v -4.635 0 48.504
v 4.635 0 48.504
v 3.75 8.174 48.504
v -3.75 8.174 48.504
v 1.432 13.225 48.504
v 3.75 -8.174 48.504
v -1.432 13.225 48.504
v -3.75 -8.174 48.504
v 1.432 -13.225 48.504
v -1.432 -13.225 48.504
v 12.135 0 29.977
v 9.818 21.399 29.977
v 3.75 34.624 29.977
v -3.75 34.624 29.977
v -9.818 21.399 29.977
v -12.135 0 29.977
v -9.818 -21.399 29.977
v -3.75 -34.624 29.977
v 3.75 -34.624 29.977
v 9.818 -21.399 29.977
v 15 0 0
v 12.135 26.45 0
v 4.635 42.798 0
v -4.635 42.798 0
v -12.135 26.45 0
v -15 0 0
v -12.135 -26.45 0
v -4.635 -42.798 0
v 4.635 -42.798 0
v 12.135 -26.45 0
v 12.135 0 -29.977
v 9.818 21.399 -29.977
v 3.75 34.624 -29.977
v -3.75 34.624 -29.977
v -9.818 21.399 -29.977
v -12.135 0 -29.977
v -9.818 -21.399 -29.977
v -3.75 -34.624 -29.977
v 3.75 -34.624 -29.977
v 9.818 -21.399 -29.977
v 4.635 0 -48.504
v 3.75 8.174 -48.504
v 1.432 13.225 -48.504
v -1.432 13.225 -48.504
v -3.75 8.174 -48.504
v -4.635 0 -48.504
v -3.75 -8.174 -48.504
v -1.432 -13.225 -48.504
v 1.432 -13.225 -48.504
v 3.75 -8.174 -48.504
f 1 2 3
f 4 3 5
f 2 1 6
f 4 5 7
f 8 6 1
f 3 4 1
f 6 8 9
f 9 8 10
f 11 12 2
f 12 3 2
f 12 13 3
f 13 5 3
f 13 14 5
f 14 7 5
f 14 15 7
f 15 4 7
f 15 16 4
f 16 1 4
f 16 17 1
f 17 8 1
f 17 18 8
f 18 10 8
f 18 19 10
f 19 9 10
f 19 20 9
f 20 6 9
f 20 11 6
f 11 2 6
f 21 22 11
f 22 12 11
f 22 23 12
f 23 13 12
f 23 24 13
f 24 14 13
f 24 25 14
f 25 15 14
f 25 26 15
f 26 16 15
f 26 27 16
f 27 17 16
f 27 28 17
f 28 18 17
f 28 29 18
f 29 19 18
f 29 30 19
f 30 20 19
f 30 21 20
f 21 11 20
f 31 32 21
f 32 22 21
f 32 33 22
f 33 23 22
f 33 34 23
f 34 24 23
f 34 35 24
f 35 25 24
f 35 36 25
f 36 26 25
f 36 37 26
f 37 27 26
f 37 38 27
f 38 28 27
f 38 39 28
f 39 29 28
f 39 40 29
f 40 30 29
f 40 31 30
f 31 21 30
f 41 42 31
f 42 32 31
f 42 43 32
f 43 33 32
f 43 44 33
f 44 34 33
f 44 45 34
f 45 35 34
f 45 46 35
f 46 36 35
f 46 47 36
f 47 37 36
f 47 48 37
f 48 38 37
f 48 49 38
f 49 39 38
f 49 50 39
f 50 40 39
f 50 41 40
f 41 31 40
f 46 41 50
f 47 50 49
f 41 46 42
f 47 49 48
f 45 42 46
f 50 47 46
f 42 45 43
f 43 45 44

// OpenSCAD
// Generated by SolidPython 1.0.1 on 2020-07-29 00:46:46


scale(v = [5, 15, 17]) {
	sphere(r = 3);
}
/***********************************************
*********      SolidPython code:      **********
************************************************
 
# import packages: SolidPython
from solid import *
from solid.utils import *
from itertools import chain, combinations, permutations


class Resize:

    def __init__(self, scad_file):
        self.scad_file = scad_file
        #self.scad_file = import_scad(scad_file)
        # cone/cylinder param:
        self.r1 = 0
        self.r2 = 0
        self.h = 0
        # rectangular prism param:
        self.w = 0
        self.l = 0
        # ellipse param:
        self.r = 0

    # import OpenScad code (file name corresponds to shape)


    # classify shape + parameters
    def assign(self, param1, param2, param3):
        if self.scad_file == 'cone.scad':
            self.r1 = param1
            self.r2 = param2
            self.h = param3
        elif self.scad_file == 'cylinder.scad':
            self.r1 = param1
            self.r2 = param2
            self.h = param3
        elif self.scad_file == 'rectangularPrism.scad':
            self.h = param1
            self.l = param2
            self.w = param3
        else:
            self.r = param1
            self.h = param2

    # resize parameters
    def iterate(self):
        x = range(3, 20, 2)
        i = 1
        if self.scad_file == 'cone.scad':
            tempList = list(permutations(x, 2))
            for temp in tempList:
                param1 = temp[0]
                param2 = temp[1]
                filepath = 'produced_scad_files/' + 'cone' + str(param1) + '_' + str(param2) + '_' + '.scad'
                scad_render_to_file(cylinder(h=param1, r1=param2, r2=0), filepath)

        elif self.scad_file == 'cylinder.scad':
            tempList = list(permutations(x, 3))
            for temp in tempList:
                param1 = temp[0]
                param2 = temp[1]
                filepath = 'produced_scad_files/' + 'cylinder' + str(param1) + '_' + str(param2) + '_' + '.scad'
                scad_render_to_file(cylinder(h=param1, r1=param2, r2=param2), filepath)

        elif self.scad_file == 'rectangularPrism.scad':
            tempList = list(permutations(x, 3))
            for temp in tempList:
                param1 = temp[0]
                param2 = temp[1]
                param3 = temp[2]
                filepath = 'produced_scad_files/' + 'rectangularPrism' + str(param1) + '_' + str(param2) + '_' + str(
                    param3) + '.scad'
                scad_render_to_file(cube(size=(param1, param2, param3)), filepath)

        elif self.scad_file == 'ellipse.scad':
            tempList = list(permutations(x, 4))
            for temp in tempList:
                param1 = temp[0]
                param2 = temp[1]
                param3 = temp[2]
                param4 = temp[3]
                filepath = 'produced_scad_files/' + 'ellipse' + str(param1) + '_' + str(param2) + '_' + str(param3) + '_' + str(param4) + '.scad'
                scad_render_to_file(scale([param1, param2, param3])(sphere(r=param4)), filepath)

    def render_to_scadfile(self):
        scad_render_to_file(scad, 'example.scad') 
 
************************************************/
